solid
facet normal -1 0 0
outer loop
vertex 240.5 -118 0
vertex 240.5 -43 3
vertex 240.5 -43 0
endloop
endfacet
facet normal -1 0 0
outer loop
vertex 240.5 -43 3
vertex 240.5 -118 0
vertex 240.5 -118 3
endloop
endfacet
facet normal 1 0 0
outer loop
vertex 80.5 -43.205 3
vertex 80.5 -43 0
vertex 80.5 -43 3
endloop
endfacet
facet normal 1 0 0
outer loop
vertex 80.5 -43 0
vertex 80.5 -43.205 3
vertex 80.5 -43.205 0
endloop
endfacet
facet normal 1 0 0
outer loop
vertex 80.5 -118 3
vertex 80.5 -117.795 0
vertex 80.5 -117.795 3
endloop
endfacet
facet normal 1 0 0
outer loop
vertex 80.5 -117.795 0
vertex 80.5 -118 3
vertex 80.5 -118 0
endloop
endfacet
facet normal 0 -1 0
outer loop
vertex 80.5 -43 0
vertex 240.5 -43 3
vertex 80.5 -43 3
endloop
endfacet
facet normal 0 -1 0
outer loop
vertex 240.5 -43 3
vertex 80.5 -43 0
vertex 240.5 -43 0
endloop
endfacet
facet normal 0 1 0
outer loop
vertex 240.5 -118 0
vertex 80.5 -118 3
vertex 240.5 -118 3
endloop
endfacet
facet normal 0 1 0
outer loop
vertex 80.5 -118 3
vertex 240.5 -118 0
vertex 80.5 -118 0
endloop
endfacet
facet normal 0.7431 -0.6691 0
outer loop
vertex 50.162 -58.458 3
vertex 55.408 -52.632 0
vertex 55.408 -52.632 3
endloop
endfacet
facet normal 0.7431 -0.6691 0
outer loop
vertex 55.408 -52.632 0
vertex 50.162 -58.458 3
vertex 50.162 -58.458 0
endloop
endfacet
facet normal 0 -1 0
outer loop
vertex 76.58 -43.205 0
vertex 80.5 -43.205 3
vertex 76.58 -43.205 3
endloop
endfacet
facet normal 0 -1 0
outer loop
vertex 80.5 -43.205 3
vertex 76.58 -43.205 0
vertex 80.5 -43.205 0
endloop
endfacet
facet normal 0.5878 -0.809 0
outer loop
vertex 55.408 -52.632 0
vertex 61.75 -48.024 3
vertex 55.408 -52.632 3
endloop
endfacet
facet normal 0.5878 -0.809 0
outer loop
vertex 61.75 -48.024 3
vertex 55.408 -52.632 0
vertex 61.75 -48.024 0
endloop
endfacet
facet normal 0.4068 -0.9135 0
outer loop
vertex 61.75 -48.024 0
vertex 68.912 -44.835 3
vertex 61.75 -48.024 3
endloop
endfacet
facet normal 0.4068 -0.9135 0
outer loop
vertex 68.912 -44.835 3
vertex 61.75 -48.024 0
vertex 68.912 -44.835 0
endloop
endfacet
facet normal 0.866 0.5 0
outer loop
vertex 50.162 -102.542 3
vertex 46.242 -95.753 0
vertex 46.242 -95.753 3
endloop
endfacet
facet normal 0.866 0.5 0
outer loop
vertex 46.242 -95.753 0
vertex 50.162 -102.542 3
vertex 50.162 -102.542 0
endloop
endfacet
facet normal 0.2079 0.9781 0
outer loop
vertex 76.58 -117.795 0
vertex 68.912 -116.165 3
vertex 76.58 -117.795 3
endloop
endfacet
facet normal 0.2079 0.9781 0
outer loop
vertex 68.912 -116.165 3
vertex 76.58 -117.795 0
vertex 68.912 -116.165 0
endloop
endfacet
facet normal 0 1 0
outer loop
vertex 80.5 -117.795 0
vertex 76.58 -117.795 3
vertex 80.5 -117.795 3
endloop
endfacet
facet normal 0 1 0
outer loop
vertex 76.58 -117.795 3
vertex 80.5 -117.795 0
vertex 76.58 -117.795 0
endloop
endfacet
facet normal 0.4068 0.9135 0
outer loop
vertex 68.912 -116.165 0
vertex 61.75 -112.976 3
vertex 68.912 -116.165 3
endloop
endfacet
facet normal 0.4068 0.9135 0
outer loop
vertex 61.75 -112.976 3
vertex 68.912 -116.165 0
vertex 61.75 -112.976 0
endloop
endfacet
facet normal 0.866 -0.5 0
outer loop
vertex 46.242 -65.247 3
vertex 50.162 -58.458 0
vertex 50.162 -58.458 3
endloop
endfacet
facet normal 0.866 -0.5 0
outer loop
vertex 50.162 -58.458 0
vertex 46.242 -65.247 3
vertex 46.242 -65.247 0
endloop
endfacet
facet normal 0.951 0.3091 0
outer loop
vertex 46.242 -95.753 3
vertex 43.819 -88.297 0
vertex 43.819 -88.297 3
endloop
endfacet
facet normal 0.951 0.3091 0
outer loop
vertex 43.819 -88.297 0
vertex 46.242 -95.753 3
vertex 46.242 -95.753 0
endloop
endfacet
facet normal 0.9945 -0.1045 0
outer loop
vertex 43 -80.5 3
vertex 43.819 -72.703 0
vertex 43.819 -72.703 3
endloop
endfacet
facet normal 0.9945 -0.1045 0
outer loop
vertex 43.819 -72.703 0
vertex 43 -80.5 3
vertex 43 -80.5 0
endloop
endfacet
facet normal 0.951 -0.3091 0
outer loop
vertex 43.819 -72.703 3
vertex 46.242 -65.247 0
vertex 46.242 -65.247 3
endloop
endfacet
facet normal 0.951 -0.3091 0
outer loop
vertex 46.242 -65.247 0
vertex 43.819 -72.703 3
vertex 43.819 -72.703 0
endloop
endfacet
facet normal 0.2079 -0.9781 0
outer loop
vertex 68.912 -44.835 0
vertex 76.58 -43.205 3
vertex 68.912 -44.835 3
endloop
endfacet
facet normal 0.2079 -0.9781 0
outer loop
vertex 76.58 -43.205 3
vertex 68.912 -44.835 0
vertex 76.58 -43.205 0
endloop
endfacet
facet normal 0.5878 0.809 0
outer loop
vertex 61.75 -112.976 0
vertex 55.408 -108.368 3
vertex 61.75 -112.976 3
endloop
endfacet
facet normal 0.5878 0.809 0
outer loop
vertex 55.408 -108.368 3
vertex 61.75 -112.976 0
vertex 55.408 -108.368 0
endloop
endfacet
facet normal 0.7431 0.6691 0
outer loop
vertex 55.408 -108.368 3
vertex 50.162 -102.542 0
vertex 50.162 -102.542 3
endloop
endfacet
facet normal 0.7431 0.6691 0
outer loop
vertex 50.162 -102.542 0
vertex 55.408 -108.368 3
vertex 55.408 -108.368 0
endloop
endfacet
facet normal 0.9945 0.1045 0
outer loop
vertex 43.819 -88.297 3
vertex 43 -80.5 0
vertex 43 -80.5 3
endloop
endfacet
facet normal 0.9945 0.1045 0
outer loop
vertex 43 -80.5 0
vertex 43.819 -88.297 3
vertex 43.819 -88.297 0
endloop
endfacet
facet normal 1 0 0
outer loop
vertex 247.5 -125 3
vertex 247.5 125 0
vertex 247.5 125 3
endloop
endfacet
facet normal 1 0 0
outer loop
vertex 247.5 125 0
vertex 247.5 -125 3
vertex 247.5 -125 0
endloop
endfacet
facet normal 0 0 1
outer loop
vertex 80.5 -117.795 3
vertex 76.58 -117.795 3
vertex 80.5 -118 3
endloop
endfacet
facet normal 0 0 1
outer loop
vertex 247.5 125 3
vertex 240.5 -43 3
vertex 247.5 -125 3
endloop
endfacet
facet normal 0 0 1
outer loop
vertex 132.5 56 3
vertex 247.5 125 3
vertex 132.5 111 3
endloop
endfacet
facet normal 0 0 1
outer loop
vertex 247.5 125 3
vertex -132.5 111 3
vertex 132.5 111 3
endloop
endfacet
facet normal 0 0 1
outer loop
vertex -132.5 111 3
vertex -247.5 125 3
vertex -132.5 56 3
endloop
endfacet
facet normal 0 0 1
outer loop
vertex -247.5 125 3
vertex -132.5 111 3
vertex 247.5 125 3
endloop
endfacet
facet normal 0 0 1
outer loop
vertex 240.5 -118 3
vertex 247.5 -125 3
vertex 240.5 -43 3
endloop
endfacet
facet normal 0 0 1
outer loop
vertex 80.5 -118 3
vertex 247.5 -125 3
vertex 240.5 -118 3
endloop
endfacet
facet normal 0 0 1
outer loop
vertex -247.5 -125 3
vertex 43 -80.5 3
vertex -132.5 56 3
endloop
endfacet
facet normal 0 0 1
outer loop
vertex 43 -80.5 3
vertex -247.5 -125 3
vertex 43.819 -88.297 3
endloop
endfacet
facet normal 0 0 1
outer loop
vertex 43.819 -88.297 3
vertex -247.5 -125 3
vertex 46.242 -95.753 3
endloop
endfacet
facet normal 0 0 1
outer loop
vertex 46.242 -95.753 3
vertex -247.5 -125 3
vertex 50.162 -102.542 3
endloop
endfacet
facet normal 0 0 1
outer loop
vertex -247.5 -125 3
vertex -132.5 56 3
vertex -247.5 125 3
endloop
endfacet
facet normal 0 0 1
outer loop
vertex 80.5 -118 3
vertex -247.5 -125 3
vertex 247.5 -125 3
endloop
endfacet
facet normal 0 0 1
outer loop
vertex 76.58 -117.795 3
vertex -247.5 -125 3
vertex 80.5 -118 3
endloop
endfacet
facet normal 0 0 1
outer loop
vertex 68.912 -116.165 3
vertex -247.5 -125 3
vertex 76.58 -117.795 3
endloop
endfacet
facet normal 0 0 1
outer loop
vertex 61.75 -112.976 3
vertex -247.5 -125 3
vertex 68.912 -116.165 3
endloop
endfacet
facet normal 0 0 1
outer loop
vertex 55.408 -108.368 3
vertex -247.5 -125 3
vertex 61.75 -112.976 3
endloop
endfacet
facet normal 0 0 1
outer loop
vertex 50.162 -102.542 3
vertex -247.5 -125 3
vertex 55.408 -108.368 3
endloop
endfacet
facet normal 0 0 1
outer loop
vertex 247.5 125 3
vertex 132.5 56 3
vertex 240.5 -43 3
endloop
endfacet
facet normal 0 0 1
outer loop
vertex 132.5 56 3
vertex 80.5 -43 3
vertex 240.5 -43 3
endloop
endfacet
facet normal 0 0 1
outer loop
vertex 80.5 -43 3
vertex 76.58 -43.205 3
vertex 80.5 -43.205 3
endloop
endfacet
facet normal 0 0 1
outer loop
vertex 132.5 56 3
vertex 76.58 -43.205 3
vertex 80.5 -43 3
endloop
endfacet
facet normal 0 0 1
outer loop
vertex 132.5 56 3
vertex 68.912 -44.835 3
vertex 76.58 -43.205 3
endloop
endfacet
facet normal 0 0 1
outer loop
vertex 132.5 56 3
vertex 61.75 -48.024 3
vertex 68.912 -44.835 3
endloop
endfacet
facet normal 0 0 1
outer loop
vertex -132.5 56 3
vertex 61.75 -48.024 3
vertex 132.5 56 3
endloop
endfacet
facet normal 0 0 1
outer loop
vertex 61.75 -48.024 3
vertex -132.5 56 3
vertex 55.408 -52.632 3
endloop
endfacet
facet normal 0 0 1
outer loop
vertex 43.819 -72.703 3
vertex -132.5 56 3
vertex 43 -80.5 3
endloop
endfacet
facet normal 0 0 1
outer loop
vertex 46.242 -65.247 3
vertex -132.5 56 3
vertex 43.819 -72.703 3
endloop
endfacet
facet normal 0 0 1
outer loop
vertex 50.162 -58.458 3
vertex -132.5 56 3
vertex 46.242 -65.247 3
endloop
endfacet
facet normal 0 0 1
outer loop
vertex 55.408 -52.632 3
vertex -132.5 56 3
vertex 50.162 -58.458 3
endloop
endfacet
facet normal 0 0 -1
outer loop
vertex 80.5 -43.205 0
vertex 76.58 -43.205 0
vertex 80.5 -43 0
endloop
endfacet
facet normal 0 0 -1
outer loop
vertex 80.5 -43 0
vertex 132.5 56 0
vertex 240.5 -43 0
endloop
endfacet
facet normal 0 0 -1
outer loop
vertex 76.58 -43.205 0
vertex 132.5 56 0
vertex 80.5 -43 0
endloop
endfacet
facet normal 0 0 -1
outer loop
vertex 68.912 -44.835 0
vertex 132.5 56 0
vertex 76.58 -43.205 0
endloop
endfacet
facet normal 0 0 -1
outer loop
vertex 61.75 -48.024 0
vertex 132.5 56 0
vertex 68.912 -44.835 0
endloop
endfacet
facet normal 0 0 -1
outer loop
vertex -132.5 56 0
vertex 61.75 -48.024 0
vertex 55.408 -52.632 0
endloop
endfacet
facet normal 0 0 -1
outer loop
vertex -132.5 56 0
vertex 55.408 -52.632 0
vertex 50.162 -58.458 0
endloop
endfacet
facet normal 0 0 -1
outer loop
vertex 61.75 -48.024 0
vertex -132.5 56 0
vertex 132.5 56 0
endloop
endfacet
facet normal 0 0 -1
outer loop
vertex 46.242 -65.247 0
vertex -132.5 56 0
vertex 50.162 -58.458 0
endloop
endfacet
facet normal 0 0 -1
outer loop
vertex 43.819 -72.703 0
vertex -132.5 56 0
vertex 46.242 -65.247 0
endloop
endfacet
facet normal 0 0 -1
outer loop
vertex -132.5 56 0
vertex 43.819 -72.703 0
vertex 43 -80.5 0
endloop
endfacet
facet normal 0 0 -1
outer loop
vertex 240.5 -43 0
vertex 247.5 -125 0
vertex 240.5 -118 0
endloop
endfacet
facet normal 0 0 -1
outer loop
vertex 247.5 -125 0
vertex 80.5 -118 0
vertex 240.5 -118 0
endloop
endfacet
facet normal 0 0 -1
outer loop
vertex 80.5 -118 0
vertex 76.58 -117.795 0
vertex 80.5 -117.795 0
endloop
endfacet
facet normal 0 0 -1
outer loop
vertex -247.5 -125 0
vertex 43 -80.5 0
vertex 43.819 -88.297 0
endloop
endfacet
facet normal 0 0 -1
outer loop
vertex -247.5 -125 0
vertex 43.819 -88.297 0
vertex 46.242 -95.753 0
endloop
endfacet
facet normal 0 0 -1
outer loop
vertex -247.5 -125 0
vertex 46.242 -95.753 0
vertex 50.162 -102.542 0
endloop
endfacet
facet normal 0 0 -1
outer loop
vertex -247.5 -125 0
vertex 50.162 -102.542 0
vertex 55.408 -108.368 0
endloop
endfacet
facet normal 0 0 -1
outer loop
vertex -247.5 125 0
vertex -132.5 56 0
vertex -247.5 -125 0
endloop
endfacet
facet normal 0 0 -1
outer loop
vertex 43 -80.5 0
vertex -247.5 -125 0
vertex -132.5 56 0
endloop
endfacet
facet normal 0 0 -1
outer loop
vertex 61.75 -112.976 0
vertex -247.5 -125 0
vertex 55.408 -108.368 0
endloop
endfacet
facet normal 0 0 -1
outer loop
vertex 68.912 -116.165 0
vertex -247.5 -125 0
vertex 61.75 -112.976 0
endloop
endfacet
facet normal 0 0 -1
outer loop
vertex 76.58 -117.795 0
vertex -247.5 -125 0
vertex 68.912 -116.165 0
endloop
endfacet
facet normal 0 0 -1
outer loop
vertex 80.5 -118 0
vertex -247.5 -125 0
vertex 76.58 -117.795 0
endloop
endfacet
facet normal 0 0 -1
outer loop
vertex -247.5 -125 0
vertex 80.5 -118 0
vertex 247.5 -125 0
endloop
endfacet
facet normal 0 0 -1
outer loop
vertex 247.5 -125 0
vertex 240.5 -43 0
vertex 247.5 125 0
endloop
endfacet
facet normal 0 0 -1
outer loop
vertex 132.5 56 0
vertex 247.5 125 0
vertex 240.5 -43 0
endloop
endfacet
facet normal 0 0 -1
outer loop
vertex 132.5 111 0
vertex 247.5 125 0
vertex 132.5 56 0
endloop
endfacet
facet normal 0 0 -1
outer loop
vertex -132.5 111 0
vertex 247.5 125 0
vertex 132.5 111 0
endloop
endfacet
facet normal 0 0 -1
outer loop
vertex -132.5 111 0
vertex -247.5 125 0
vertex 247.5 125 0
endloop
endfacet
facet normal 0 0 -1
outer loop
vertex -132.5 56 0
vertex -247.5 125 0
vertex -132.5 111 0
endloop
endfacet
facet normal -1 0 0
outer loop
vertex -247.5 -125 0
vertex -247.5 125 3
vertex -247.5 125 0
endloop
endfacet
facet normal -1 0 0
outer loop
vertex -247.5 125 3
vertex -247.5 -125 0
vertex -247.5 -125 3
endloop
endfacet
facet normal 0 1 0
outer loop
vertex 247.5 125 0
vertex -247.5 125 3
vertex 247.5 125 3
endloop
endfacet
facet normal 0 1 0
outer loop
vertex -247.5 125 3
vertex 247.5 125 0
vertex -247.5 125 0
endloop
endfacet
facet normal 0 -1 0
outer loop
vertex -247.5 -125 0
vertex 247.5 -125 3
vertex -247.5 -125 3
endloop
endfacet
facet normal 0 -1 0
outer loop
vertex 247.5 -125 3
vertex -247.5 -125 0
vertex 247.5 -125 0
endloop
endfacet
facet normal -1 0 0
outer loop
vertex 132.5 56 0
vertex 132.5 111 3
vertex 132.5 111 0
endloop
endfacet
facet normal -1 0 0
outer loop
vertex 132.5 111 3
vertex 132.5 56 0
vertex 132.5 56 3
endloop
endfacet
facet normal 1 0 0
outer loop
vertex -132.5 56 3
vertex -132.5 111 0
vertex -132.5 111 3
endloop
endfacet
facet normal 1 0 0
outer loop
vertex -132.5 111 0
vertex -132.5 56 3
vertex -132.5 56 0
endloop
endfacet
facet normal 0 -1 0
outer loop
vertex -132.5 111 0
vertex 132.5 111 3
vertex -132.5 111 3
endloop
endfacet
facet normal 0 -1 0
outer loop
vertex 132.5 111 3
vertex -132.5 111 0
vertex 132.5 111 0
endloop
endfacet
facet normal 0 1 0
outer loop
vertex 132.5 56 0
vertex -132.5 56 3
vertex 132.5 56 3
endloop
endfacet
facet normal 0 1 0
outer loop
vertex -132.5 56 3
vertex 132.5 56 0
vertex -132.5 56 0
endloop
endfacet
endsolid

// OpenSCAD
THICKNESS = 3; // see if varying between about 1.5 and 10.0 changes quote much
OVERLAP_FIXER_THING = 0.002;
OVERLAP_FIXER_OFFEST = 0.001;
CUTOUT_THICKNESS = THICKNESS + OVERLAP_FIXER_THING;
// tank dimensions
MAX_WIDTH = 495;
MAX_DEPTH = 250;
LIP_DEPTH = 7;

// Accesory dimensions
// existing lamp
LAMP_WIDTH = 265;
LAMP_DEPTH = 55;
LAMP_DEPTH_INSET = 11;
LAMP_WIDTH_INSET_NORTH = 20;
LAMP_WIDTH_INSET_SOUTH = 35;

// filter wood protrusion
WOOD_OPENING_WIDTH_LIMIT = 160;
WOOD_OPENING_DEPTH_LIMIT = 75;

// net cup
NET_CUP_LIP_DIAMETER = 54.4;
NET_CUP_UPPER_DIAMETER = 50;



module LampCutout() {
    translate([MAX_WIDTH / 2 - LAMP_WIDTH / 2, MAX_DEPTH - LAMP_DEPTH - LIP_DEPTH * 2, -OVERLAP_FIXER_OFFEST])
        cube([LAMP_WIDTH, LAMP_DEPTH, CUTOUT_THICKNESS]);
}


module WoodOpeningBase() {
    translate([MAX_WIDTH - WOOD_OPENING_WIDTH_LIMIT - LIP_DEPTH, LIP_DEPTH, 0])
        cube([WOOD_OPENING_WIDTH_LIMIT, WOOD_OPENING_DEPTH_LIMIT, CUTOUT_THICKNESS]);
}
module WoodOpeningRound() {
    translate([MAX_WIDTH - WOOD_OPENING_WIDTH_LIMIT - LIP_DEPTH, WOOD_OPENING_DEPTH_LIMIT / 2 + LIP_DEPTH, 0])
        cylinder(h=CUTOUT_THICKNESS, d=WOOD_OPENING_DEPTH_LIMIT);
}
module WoodCutout() {
    translate([0, 0, -OVERLAP_FIXER_OFFEST])
    union() {
        WoodOpeningBase();
        WoodOpeningRound();
    }
}
module MainSheet() {
    cube([MAX_WIDTH, MAX_DEPTH, THICKNESS]);
}

module TenGallonLid() {
    difference() {
        MainSheet();
        WoodCutout();
        LampCutout();
    }
}

translate([-MAX_WIDTH / 2, -MAX_DEPTH / 2, 0]) {
    TenGallonLid();
}
